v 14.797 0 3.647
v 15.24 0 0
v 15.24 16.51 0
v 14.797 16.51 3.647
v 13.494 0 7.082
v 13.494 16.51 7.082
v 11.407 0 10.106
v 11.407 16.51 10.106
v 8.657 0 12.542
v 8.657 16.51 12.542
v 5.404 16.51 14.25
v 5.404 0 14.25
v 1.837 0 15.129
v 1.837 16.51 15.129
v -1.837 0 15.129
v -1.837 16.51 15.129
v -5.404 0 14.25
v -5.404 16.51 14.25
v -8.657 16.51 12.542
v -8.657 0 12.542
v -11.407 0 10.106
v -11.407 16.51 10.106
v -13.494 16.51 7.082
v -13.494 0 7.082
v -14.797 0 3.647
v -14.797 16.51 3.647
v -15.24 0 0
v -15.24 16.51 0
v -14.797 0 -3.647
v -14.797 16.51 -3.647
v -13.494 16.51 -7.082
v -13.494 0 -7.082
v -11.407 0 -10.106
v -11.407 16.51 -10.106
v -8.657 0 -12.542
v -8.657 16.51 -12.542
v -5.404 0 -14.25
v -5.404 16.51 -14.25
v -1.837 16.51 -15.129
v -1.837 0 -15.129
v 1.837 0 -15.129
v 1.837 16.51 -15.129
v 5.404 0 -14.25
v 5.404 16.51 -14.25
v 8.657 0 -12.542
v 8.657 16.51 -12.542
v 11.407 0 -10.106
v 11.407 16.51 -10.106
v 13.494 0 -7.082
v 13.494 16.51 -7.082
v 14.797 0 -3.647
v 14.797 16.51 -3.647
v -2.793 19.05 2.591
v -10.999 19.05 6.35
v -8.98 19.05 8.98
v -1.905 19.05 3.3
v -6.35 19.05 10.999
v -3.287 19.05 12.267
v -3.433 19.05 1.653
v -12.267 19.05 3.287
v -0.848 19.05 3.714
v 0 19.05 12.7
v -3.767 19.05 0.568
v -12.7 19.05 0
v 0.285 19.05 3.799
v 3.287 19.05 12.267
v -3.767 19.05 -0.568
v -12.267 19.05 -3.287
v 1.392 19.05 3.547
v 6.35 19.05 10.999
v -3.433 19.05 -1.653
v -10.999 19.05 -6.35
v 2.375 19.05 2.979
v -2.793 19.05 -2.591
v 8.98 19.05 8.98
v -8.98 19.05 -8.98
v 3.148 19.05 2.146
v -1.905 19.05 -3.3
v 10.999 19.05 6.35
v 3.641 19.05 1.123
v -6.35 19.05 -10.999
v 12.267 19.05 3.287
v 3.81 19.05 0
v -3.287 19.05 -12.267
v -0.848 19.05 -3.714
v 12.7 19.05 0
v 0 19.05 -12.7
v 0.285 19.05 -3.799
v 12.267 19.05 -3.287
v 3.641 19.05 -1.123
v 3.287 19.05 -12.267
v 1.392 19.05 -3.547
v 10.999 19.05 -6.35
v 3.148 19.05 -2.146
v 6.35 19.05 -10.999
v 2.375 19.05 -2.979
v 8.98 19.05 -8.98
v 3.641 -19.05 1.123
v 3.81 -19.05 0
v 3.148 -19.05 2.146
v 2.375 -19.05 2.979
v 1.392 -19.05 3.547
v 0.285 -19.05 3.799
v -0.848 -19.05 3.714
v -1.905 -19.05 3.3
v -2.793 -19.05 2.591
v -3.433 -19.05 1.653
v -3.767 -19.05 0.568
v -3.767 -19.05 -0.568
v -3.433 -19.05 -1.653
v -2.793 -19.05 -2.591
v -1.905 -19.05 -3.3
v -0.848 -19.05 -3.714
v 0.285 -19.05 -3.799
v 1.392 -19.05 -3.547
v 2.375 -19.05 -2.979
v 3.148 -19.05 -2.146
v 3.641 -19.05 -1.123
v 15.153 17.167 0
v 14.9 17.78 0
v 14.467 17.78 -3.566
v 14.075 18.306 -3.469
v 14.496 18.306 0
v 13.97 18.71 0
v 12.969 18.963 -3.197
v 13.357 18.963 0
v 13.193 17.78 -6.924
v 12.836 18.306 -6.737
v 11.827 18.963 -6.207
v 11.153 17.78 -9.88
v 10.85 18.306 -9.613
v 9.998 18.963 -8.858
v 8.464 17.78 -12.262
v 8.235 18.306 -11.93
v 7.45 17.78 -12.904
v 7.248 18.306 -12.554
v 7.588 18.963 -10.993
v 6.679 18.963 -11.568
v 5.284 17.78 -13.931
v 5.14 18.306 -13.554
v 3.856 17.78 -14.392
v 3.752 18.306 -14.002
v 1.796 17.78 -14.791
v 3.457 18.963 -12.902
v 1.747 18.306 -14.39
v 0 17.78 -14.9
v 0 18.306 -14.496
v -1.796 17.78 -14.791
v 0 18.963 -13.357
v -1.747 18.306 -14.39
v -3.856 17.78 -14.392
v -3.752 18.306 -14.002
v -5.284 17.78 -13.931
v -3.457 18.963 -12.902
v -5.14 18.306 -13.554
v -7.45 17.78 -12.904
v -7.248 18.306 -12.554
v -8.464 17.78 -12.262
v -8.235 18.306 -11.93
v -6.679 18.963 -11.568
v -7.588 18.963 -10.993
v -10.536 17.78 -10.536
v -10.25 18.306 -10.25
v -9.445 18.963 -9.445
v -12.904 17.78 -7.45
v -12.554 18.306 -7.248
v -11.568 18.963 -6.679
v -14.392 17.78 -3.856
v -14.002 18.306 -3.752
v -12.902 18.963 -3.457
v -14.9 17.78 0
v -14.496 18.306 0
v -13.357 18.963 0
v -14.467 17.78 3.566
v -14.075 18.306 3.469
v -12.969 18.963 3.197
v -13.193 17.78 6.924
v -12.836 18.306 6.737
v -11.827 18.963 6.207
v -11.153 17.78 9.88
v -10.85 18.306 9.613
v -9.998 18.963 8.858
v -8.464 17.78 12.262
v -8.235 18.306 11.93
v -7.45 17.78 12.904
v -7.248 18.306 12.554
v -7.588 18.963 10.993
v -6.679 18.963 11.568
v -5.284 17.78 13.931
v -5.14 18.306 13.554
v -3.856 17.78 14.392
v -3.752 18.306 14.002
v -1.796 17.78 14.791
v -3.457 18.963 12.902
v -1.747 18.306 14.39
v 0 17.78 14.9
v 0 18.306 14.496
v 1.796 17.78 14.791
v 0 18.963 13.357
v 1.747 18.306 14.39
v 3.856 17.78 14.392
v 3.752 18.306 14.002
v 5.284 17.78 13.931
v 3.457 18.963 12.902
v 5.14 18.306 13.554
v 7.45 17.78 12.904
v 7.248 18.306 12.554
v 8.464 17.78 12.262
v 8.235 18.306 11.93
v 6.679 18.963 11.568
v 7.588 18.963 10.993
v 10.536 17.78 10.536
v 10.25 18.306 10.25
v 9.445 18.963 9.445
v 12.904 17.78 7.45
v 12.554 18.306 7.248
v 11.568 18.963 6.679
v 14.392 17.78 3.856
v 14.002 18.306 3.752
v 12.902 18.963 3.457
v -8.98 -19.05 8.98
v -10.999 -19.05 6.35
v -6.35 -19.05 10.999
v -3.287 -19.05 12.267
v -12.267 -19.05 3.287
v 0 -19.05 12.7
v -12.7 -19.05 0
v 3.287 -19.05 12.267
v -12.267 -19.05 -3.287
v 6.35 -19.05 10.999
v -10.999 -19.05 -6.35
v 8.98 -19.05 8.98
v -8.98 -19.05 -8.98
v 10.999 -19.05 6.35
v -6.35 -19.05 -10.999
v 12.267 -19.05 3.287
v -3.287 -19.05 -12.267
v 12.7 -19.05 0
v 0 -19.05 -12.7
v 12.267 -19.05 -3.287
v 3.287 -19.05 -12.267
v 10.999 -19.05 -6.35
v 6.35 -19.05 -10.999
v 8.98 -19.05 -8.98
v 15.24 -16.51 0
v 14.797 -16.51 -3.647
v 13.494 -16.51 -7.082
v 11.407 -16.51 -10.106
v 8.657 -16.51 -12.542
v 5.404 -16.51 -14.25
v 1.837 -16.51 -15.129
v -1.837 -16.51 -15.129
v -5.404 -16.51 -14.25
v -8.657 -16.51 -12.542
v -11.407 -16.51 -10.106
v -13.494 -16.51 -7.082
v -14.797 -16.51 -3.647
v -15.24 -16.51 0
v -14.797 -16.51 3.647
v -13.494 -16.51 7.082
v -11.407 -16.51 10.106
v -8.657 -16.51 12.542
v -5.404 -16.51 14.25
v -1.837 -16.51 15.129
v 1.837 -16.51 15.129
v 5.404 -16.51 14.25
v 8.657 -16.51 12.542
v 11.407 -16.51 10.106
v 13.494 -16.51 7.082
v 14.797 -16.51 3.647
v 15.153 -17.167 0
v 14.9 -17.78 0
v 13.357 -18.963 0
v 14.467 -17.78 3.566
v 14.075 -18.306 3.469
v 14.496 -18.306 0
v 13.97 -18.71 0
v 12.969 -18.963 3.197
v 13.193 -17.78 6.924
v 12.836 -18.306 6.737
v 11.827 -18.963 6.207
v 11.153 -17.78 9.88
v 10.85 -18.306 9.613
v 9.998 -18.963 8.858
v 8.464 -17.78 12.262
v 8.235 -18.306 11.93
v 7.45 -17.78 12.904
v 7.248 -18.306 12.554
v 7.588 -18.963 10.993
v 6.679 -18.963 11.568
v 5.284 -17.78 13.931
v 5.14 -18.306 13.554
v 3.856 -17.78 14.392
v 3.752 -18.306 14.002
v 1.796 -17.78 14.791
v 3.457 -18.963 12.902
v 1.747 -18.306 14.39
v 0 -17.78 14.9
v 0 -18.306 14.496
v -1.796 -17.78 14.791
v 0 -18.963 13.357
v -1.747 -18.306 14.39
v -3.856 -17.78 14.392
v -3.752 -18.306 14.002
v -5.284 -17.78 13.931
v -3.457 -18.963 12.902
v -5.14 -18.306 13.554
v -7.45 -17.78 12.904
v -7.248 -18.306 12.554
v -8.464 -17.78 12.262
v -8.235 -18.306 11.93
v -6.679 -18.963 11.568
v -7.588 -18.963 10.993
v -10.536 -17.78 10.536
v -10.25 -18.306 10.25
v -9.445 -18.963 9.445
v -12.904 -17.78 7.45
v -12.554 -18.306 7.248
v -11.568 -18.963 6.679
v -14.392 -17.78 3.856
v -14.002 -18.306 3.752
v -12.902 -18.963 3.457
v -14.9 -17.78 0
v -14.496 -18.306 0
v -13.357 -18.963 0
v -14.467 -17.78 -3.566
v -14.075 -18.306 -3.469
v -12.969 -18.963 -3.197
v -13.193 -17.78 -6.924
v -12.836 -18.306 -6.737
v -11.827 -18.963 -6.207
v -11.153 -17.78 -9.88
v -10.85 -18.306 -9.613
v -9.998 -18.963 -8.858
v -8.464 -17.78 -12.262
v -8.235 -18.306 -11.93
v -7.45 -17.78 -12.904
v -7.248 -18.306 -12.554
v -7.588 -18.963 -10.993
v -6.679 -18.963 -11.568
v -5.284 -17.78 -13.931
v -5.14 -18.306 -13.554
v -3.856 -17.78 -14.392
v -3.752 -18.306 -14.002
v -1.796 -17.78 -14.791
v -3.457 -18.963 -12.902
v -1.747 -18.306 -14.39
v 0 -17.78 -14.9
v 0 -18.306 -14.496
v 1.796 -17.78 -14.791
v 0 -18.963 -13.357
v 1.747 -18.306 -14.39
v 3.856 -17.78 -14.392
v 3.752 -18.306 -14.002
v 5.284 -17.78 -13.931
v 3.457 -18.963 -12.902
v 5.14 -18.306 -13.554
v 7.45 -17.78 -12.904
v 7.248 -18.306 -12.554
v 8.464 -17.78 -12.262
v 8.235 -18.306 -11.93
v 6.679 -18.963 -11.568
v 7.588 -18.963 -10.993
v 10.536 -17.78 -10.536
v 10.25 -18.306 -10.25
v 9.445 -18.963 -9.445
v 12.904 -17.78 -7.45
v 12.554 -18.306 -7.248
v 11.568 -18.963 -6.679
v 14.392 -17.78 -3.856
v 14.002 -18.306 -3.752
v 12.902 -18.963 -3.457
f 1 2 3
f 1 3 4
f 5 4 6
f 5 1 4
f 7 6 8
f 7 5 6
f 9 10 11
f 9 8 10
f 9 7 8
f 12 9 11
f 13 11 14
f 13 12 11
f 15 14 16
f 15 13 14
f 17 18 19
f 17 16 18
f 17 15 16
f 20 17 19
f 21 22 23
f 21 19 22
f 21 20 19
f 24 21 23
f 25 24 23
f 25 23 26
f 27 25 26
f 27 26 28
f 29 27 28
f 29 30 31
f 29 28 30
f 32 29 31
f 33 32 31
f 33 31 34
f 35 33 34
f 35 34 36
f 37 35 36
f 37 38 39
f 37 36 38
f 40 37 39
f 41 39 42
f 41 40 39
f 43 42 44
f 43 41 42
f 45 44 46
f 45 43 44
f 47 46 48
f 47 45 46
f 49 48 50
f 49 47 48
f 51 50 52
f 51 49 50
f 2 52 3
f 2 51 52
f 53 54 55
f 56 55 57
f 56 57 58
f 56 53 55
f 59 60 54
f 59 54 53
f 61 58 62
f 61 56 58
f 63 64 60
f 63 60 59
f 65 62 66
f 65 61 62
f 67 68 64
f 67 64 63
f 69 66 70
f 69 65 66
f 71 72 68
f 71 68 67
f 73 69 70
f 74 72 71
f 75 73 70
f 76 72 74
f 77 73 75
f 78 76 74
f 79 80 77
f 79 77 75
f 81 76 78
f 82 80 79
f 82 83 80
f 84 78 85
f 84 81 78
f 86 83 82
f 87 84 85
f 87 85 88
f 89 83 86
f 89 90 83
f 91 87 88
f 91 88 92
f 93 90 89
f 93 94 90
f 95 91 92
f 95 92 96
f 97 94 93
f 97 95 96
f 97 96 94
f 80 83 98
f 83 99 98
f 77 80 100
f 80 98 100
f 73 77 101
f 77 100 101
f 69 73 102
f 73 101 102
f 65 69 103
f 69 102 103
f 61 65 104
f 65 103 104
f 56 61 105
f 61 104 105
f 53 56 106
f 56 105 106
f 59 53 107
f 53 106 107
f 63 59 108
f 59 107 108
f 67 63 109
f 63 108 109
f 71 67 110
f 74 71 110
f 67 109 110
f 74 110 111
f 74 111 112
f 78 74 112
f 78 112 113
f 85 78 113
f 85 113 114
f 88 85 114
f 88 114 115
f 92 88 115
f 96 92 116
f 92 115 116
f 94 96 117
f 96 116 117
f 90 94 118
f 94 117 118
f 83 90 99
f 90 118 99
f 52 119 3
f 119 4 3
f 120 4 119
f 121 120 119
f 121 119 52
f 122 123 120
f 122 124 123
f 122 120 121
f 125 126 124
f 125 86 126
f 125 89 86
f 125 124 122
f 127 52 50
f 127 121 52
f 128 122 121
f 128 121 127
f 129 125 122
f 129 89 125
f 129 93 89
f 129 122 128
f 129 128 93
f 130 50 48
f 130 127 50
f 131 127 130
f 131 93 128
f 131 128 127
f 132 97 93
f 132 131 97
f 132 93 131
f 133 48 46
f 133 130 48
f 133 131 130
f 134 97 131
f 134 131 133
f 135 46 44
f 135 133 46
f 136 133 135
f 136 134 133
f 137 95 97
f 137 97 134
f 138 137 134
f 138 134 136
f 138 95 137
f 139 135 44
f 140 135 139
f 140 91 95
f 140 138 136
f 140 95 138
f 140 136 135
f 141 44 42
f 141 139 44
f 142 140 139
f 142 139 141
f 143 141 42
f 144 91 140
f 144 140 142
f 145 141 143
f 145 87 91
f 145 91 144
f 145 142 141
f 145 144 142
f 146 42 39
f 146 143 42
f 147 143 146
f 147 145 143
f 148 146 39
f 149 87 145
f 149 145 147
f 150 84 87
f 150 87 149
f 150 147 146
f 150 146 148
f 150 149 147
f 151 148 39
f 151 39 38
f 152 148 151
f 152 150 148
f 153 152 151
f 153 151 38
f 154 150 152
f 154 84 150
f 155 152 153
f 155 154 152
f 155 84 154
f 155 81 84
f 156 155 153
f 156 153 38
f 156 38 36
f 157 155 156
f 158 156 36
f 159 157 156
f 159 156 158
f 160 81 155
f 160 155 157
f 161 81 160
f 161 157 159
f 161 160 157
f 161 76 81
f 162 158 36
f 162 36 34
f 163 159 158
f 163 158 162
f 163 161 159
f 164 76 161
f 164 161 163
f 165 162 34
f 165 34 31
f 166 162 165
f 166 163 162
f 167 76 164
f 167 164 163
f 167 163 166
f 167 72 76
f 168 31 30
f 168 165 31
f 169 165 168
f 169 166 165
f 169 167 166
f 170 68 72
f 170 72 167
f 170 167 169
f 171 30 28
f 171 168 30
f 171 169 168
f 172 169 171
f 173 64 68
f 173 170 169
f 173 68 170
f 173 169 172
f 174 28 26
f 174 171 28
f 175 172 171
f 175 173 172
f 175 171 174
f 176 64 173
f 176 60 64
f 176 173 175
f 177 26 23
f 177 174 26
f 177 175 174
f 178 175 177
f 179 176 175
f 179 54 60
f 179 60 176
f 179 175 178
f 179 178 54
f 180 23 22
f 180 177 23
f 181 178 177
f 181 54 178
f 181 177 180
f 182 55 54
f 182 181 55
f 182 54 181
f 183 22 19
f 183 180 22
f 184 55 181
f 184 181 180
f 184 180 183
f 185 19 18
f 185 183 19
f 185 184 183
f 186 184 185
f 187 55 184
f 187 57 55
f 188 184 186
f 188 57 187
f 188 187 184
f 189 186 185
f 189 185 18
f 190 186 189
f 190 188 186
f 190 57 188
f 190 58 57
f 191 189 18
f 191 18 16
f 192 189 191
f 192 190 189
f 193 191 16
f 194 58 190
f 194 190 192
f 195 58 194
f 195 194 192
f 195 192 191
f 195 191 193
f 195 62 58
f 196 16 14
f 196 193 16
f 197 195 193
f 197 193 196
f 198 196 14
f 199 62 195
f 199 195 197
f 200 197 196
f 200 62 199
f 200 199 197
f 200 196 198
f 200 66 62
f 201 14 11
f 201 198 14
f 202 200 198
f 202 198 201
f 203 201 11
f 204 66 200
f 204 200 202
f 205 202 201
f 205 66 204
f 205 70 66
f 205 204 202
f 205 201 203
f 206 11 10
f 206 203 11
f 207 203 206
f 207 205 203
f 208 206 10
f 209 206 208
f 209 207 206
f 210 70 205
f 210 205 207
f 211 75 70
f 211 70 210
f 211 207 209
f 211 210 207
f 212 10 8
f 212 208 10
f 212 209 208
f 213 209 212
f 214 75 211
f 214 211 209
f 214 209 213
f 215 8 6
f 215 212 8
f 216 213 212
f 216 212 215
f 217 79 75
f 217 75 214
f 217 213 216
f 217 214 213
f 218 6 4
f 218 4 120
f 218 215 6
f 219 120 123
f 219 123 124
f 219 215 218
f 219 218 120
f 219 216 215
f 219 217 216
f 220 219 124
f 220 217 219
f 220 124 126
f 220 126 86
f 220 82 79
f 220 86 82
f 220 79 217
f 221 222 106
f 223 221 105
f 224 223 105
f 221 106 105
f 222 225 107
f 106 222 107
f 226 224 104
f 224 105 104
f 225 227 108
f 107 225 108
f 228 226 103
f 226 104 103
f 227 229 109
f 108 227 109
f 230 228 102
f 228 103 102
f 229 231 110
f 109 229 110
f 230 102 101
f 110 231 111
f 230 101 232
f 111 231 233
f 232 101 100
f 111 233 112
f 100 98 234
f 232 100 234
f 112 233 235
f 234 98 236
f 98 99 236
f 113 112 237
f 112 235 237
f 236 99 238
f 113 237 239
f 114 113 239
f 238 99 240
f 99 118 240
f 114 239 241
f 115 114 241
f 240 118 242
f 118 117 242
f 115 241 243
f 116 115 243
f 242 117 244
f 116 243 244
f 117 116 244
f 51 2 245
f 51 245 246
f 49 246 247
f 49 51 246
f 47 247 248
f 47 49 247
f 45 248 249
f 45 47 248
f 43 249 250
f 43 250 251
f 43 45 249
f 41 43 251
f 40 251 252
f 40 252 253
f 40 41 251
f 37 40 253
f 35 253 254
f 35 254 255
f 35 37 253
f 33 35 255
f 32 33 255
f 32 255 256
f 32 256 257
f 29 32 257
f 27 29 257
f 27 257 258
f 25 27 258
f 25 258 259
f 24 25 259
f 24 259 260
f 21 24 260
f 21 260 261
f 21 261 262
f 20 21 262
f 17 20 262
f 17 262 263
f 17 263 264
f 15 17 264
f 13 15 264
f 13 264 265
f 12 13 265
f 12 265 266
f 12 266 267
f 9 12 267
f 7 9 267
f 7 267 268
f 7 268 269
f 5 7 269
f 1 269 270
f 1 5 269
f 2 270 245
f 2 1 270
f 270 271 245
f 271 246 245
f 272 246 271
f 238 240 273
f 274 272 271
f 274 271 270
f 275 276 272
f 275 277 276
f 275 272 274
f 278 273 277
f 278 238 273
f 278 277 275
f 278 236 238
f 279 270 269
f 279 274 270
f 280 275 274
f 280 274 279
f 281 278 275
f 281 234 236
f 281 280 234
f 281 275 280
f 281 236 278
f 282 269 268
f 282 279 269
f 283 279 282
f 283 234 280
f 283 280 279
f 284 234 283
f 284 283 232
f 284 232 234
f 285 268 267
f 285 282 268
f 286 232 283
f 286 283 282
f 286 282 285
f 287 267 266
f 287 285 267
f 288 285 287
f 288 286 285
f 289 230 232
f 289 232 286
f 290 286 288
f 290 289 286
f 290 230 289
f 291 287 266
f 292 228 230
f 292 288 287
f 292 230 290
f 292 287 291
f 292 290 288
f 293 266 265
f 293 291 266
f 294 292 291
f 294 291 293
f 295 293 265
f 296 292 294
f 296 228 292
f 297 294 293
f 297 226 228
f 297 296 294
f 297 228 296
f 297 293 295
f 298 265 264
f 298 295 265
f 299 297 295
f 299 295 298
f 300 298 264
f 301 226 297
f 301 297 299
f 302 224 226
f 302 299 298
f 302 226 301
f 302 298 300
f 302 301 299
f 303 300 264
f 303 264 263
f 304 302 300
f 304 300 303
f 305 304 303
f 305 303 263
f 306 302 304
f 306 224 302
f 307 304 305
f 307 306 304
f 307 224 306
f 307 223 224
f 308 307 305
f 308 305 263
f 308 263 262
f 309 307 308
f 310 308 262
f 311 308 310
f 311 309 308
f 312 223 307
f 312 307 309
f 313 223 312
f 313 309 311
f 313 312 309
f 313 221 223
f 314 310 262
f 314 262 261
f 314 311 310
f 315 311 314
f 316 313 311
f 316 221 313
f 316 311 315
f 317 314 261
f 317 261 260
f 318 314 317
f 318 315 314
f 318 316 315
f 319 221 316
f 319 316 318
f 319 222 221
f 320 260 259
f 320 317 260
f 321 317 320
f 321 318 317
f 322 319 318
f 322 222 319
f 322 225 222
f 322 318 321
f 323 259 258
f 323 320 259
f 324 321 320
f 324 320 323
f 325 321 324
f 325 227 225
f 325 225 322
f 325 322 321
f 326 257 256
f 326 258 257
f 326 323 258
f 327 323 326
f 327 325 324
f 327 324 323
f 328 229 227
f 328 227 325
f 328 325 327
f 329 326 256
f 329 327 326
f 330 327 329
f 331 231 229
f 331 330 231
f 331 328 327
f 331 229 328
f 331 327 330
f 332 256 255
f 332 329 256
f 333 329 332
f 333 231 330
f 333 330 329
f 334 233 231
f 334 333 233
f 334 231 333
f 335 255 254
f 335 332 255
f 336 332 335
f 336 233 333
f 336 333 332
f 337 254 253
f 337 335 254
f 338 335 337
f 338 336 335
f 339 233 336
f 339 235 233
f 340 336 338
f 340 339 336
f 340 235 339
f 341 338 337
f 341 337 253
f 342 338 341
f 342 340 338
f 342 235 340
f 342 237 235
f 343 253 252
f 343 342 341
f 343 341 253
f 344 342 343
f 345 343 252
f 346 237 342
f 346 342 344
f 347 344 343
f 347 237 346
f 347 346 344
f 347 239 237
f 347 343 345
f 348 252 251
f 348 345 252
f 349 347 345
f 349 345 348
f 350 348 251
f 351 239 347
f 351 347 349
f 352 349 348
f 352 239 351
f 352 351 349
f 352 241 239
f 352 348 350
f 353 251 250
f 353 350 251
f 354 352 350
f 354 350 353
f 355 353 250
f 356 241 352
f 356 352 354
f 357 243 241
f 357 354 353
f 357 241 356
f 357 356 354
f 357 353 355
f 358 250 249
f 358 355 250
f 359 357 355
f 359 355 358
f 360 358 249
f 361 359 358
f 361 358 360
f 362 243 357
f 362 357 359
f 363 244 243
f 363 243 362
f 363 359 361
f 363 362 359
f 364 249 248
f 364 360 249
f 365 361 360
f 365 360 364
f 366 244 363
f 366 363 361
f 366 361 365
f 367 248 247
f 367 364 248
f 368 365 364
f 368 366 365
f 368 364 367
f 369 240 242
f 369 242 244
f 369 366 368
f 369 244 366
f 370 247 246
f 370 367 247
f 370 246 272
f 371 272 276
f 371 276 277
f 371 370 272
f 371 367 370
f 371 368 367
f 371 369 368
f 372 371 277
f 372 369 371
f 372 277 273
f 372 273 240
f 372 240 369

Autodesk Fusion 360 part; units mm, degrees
sketch "Sketch1" plane through (0, 0, 0) normal (0, 1, 0) x (1, 0, 0)
  circle A0 centre (0, 0) radius 15.24
  dimension "d1" = 30.48
extrude "Extrude1" add sketch "Sketch1" along normal mid plane 38.1
fillet "Fillet1" radius 2.54 2 edges at (-14.2087, -19.05, -5.511) (-14.2087, 19.05, 5.511)
sketch "Sketch2" plane through (0, -19.05, 0) normal (0, -1, 0) x (1, 0, 0)
  circle A0 centre (0, 0) radius 12.7
  circle A1 centre (0, 0) radius 3.81
  dimension "d6" = 7.62
extrude "Extrude2" cut sketch "Sketch2" against normal through all contours A1
